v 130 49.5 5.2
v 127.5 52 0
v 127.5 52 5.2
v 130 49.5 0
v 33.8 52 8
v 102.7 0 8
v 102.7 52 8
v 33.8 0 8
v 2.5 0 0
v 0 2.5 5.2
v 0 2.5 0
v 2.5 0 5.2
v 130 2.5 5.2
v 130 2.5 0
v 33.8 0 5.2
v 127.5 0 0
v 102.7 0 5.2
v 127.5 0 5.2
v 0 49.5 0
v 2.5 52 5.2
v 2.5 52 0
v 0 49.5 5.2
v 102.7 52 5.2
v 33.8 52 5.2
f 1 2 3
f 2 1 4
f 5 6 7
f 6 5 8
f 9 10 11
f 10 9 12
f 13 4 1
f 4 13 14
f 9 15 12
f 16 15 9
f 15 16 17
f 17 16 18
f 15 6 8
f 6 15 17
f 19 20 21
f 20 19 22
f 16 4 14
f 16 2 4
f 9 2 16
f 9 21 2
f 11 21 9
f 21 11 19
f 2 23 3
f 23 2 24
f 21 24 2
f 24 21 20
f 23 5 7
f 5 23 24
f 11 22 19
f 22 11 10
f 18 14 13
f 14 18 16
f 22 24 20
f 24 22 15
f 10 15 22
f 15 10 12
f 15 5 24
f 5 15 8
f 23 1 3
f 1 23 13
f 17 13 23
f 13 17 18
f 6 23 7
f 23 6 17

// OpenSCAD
$fn = 32;

// ----------------------------------------------------------------------
// Stepped bar: centerstep, 130 x 52 x 8/5.2 mm
// ----------------------------------------------------------------------

// --- parameters (mm) ---
bar_l = 130;              // bar length, X
bar_w = 52;               // bar width, Y
plate_t = 8;              // thickness of the thick zone, Z
thin_t = 5.2;             // thickness of the thin zone
corner_c = 2.5;           // corner chamfer of the bar
step_cut = 2.8;           // material removed from the thin zone
thick_from = 33.8;        // start of the thick middle zone
thick_to = 102.7;         // end of the thick middle zone
depth_1 = 2.8;            // depth of cut 1 from the top face
depth_2 = 2.8;            // depth of cut 2 from the top face
fit_tol = 0.02;           // declared fit tolerance (prompt contract)
free_tol = 0.2;           // declared free tolerance (prompt contract)

profile = [[2.5, 0], [127.5, 0], [130, 2.5], [130, 49.5], [127.5, 52], [2.5, 52], [0, 49.5], [0, 2.5]];  // primary outline, 8 points, counter clockwise
void_1 = [[-1, -1], [33.8, -1], [33.8, 53], [-1, 53]];  // thin left end, 4 points
void_2 = [[102.7, -1], [131, -1], [131, 53], [102.7, 53]];  // thin right end, 4 points

// --- the one profile operation ---
difference() {
  linear_extrude(height = plate_t) polygon(points = profile);
  translate([0, 0, plate_t - depth_1])
    linear_extrude(height = depth_1 + 1) polygon(points = void_1);
  translate([0, 0, plate_t - depth_2])
    linear_extrude(height = depth_2 + 1) polygon(points = void_2);
}
